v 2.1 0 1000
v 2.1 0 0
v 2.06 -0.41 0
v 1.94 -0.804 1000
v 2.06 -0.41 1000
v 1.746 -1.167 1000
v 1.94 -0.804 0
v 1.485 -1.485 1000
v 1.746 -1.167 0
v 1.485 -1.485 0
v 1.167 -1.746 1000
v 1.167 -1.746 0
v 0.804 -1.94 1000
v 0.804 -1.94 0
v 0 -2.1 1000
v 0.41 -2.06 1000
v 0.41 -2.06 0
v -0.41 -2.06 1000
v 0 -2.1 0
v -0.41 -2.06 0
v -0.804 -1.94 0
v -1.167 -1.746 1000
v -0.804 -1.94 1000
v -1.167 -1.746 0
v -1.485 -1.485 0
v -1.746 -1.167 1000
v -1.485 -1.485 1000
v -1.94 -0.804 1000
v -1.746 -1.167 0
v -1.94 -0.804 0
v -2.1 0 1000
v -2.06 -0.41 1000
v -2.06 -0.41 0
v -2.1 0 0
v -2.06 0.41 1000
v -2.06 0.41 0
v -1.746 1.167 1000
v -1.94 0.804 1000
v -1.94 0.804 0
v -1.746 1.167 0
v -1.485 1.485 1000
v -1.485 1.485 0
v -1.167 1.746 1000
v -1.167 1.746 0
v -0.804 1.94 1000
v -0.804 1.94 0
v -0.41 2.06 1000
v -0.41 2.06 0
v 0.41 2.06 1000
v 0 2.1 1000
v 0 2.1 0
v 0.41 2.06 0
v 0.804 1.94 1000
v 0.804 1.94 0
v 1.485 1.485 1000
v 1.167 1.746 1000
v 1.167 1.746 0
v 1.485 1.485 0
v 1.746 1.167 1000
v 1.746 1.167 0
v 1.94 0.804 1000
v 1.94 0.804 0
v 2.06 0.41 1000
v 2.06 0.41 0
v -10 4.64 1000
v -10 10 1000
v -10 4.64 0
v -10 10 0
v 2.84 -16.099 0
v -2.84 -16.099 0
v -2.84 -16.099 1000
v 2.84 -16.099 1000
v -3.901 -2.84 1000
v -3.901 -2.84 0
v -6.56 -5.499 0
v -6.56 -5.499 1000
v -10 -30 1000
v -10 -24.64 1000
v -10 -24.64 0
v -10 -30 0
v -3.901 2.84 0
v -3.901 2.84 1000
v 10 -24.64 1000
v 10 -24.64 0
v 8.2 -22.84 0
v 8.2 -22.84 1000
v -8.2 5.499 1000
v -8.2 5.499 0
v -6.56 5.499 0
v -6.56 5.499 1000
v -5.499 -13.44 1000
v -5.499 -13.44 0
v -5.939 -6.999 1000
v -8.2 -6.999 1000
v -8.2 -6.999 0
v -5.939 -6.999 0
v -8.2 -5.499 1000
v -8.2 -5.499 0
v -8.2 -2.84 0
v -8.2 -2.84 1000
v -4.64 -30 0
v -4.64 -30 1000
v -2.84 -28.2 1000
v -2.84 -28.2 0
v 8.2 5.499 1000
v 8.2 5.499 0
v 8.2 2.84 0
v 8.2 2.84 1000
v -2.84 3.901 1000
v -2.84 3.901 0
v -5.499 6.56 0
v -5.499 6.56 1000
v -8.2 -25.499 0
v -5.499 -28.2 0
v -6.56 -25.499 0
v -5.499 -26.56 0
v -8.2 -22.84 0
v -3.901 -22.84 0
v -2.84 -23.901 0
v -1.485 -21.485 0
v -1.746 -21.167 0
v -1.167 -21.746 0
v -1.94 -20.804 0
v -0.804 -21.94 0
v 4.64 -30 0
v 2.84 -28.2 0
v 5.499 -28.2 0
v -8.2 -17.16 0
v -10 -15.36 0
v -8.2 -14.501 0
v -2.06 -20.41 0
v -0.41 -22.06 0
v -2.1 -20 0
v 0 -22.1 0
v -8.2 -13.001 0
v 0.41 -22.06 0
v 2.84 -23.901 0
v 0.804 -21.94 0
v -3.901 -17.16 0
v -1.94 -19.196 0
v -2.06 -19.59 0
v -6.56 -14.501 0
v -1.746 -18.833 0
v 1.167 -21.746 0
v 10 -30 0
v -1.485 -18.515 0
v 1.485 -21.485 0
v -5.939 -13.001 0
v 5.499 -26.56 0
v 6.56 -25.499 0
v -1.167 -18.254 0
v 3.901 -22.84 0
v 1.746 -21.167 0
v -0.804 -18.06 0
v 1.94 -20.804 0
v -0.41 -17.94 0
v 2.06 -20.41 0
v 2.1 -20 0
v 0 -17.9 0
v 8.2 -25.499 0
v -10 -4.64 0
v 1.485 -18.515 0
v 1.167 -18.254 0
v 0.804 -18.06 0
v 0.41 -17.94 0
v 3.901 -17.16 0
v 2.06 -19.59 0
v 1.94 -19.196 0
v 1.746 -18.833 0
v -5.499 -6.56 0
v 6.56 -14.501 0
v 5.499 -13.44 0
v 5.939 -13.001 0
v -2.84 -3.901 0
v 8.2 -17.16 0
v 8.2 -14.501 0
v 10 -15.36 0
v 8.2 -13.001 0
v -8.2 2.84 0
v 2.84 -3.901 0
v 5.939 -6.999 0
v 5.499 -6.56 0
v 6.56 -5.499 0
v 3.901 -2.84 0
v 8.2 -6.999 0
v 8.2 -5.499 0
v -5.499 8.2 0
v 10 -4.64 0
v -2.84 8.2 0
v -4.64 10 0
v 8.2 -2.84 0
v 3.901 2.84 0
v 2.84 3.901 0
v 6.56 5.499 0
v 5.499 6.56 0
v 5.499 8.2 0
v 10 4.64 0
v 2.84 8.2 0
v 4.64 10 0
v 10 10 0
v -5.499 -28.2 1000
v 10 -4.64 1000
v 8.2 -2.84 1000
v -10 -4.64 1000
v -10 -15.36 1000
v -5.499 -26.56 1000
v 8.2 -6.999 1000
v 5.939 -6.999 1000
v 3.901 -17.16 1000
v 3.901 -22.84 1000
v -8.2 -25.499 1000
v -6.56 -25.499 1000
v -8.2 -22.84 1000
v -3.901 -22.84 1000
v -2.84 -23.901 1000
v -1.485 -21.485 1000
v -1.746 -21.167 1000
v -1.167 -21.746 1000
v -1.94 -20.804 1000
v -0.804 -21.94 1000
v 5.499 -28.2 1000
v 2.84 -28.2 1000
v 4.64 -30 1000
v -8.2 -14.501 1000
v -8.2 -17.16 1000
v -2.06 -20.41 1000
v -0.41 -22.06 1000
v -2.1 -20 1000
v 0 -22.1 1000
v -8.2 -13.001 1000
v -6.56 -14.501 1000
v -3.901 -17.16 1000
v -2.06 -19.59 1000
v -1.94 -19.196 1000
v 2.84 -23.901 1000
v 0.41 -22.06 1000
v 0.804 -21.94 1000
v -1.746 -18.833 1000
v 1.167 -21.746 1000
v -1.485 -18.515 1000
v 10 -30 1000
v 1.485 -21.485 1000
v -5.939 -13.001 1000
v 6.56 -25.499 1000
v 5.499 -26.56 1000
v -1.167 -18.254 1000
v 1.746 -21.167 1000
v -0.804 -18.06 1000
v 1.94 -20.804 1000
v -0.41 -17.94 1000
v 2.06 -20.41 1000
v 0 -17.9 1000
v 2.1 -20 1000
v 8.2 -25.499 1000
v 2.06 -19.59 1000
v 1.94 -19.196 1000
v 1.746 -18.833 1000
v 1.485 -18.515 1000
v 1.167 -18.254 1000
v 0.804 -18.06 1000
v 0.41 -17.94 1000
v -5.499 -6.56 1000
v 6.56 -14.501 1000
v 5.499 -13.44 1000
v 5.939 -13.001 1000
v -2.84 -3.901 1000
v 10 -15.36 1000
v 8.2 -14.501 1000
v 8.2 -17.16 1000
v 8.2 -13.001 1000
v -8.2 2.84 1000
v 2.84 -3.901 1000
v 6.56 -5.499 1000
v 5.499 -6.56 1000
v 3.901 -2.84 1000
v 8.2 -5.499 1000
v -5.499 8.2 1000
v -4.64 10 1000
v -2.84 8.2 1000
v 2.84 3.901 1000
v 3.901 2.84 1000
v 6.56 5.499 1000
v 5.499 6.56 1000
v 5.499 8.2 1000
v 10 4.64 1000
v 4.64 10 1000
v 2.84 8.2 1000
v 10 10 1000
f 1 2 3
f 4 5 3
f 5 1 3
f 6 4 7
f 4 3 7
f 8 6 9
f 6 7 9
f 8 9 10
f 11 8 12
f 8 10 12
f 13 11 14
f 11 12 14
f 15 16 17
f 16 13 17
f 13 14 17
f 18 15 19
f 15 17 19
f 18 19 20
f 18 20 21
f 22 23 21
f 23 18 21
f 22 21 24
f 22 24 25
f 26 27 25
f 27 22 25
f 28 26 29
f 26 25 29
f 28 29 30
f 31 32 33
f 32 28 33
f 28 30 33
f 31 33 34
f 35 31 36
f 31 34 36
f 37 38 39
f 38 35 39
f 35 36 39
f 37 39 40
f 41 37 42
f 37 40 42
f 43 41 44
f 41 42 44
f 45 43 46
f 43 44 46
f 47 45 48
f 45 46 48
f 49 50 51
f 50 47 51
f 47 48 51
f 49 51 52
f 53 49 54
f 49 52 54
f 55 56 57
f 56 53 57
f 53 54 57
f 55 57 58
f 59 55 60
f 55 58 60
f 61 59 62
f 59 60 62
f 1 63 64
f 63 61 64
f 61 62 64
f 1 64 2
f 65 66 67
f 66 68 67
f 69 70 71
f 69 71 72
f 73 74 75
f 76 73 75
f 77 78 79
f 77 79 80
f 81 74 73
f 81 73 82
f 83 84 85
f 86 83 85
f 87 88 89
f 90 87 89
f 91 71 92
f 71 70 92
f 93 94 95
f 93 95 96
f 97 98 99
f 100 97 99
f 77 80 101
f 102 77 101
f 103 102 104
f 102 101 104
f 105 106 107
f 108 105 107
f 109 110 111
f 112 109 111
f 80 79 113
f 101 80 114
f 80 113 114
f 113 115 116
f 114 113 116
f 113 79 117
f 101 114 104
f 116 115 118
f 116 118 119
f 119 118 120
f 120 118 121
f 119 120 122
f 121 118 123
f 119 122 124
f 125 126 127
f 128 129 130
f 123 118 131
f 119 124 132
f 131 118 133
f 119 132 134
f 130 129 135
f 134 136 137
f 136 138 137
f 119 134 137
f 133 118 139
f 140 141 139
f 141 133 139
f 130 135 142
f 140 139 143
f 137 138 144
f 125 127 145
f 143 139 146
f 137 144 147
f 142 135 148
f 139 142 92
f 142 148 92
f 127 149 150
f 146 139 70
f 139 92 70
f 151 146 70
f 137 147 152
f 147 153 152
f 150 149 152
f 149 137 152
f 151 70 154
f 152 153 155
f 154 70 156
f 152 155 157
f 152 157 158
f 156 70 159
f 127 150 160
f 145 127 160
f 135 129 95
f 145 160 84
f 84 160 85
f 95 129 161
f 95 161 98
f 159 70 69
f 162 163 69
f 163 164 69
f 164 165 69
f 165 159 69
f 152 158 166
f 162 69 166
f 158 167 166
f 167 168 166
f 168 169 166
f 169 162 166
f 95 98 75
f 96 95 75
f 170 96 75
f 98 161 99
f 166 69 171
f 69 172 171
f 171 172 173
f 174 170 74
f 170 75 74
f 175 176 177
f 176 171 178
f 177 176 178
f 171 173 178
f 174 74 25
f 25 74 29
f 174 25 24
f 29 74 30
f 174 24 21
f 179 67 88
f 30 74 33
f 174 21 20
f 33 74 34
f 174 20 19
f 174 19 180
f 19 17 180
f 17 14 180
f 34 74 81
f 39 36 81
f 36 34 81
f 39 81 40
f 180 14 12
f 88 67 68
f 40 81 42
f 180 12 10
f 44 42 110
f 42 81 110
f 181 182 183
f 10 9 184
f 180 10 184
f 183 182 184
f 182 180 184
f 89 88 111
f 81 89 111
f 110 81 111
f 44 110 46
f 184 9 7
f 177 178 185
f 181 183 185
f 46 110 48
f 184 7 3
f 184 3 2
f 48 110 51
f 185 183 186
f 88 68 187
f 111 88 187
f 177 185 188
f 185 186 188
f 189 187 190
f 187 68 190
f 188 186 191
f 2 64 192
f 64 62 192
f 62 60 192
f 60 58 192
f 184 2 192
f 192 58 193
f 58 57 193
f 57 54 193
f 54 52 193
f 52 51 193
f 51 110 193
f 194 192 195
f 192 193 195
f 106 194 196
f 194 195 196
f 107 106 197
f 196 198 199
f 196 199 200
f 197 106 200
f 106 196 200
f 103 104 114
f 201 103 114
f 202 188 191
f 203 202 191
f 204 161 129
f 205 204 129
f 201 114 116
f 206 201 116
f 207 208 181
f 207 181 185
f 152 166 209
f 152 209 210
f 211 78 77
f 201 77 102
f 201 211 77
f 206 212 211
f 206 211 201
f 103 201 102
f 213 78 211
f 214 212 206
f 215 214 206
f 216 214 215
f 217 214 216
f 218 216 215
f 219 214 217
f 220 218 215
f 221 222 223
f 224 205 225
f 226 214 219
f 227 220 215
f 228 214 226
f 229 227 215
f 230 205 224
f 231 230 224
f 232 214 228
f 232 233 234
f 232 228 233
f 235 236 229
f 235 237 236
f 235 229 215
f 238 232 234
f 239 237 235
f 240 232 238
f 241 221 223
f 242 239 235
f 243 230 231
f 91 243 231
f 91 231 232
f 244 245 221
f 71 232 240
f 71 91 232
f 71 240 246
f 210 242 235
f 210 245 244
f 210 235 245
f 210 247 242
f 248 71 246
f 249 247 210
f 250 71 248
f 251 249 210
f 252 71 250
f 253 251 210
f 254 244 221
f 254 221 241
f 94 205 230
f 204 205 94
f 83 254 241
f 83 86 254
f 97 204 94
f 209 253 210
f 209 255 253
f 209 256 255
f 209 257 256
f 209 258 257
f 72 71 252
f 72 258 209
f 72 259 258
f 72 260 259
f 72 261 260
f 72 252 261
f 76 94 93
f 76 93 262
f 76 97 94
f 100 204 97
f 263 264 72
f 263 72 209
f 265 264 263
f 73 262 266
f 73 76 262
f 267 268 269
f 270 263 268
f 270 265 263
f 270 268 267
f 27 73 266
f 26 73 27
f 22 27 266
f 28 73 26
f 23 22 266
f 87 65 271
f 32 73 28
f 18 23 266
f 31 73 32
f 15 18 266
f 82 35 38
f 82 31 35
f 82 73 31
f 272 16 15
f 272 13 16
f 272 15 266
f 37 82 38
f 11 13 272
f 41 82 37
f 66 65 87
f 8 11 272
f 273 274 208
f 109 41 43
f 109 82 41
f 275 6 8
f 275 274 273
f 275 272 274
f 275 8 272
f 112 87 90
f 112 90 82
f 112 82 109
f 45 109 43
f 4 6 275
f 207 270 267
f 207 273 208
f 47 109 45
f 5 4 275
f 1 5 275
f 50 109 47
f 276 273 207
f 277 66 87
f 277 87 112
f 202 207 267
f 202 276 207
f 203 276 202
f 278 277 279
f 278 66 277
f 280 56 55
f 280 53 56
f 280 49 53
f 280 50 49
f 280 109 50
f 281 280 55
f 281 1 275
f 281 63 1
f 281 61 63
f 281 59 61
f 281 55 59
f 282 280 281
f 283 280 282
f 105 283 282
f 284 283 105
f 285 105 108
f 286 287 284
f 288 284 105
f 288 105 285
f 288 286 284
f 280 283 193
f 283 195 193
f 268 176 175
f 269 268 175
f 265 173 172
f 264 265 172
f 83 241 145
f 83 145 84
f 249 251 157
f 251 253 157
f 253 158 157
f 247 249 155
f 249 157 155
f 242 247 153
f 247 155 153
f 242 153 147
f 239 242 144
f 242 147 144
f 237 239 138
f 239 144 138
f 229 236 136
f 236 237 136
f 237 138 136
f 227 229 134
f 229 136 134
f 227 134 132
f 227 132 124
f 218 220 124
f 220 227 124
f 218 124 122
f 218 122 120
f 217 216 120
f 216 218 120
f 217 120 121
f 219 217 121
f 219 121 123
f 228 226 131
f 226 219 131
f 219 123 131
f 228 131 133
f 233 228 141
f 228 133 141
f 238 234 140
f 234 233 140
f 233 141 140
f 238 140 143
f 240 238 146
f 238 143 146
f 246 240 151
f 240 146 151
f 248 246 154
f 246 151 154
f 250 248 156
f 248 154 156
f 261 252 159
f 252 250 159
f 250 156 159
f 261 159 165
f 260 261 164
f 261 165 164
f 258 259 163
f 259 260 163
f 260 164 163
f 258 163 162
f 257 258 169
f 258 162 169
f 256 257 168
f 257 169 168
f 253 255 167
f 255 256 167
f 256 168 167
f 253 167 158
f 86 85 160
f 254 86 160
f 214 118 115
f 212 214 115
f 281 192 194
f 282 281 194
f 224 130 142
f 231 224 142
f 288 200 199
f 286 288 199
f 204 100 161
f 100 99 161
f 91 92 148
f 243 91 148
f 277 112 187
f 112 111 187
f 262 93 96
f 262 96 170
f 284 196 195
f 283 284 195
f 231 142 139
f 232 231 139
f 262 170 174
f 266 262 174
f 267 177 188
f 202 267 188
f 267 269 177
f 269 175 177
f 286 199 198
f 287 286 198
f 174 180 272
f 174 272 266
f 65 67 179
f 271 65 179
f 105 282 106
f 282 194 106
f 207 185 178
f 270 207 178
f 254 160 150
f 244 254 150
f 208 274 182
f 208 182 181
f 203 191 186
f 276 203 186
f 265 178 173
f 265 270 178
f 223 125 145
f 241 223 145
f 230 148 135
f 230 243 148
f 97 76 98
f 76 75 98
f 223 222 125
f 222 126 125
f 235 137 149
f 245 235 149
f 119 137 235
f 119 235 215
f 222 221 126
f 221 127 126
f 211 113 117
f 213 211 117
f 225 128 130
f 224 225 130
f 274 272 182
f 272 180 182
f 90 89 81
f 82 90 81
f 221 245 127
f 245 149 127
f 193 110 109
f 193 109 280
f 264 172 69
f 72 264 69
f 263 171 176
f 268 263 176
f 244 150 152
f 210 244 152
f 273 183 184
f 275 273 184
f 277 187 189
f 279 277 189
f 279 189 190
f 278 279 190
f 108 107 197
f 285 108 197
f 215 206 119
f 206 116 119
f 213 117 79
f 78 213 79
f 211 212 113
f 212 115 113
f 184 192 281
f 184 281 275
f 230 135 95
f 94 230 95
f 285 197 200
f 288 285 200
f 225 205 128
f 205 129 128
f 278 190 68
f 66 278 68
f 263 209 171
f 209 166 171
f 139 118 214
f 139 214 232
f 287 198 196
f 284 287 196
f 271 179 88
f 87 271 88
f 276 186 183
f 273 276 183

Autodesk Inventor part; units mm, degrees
ref_plane "YZ Plane" through (0, 0, 0) normal (1, 0, 0) x (0, 1, 0)
ref_plane "XY Plane" through (0, 0, 0) normal (0, 0, 1) x (1, 0, 0)
sketch "Sketch1" plane through (0, 0, 0) normal (0, 0, 1) x (1, 0, 0)
  line L0 (-3.9007, 3.9007) -> (3.9007, 3.9007)
  line L1 (3.9007, 3.9007) -> (3.9007, -3.9007)
  line L2 (3.9007, -3.9007) -> (-3.9007, -3.9007)
  line L3 (-3.9007, -3.9007) -> (-3.9007, 3.9007)
  line L4 (0, 3.9007) -> (0, -3.9007) construction
  line L5 (-3.9007, 0) -> (3.9007, 0) construction
  circle A0 centre (0, 0) radius 2.1
  line L6 (0, 0) -> (-16.1173, 16.1173) construction
  line L7 (0, 0) -> (22.7933, 0) construction
  line L8 (-2.84, 3.9007) -> (-5.4993, 6.56)
  line L9 (-5.4993, 6.56) -> (-5.4993, 8.2)
  line L10 (-5.4993, 8.2) -> (-2.84, 8.2)
  line L11 (-2.84, 8.2) -> (-4.64, 10)
  line L12 (-4.64, 10) -> (-10, 10)
  line L13 (-10, 10) -> (-10, 4.64)
  line L14 (-10, 4.64) -> (-8.2, 2.84)
  line L15 (-8.2, 2.84) -> (-8.2, 5.4993)
  line L16 (-8.2, 5.4993) -> (-6.56, 5.4993)
  line L17 (-6.56, 5.4993) -> (-3.9007, 2.84)
  line L18 (-3.9007, 2.84) -> (-11.3102, 2.84) construction
  line L19 (-2.84, 3.9007) -> (-3.9007, 3.9007)
  line L20 (-3.9007, 2.84) -> (-3.9007, 3.9007)
  line L21 (-3.9007, -2.84) -> (-6.56, -5.4993)
  line L22 (-6.56, -5.4993) -> (-8.2, -5.4993)
  line L23 (-8.2, -5.4993) -> (-8.2, -2.84)
  line L24 (-8.2, -2.84) -> (-10, -4.64)
  line L25 (-10, -4.64) -> (-10, -10)
  line L26 (-10, -10) -> (-4.64, -10)
  line L27 (-4.64, -10) -> (-2.84, -8.2)
  line L28 (-2.84, -8.2) -> (-5.4993, -8.2)
  line L29 (-5.4993, -8.2) -> (-5.4993, -6.56)
  line L30 (-5.4993, -6.56) -> (-2.84, -3.9007)
  line L31 (-3.9007, -2.84) -> (-3.9007, -3.9007)
  line L32 (-2.84, -3.9007) -> (-3.9007, -3.9007)
  line L33 (2.84, -3.9007) -> (5.4993, -6.56)
  line L34 (5.4993, -6.56) -> (5.4993, -8.2)
  line L35 (5.4993, -8.2) -> (2.84, -8.2)
  line L36 (2.84, -8.2) -> (4.64, -10)
  line L37 (4.64, -10) -> (10, -10)
  line L38 (10, -10) -> (10, -4.64)
  line L39 (10, -4.64) -> (8.2, -2.84)
  line L40 (8.2, -2.84) -> (8.2, -5.4993)
  line L41 (8.2, -5.4993) -> (6.56, -5.4993)
  line L42 (6.56, -5.4993) -> (3.9007, -2.84)
  line L43 (2.84, -3.9007) -> (3.9007, -3.9007)
  line L44 (3.9007, -2.84) -> (3.9007, -3.9007)
  line L45 (3.9007, 2.84) -> (6.56, 5.4993)
  line L46 (6.56, 5.4993) -> (8.2, 5.4993)
  line L47 (8.2, 5.4993) -> (8.2, 2.84)
  line L48 (8.2, 2.84) -> (10, 4.64)
  line L49 (10, 4.64) -> (10, 10)
  line L50 (10, 10) -> (4.64, 10)
  line L51 (4.64, 10) -> (2.84, 8.2)
  line L52 (2.84, 8.2) -> (5.4993, 8.2)
  line L53 (5.4993, 8.2) -> (5.4993, 6.56)
  line L54 (5.4993, 6.56) -> (2.84, 3.9007)
  line L55 (3.9007, 2.84) -> (3.9007, 3.9007)
  line L56 (2.84, 3.9007) -> (3.9007, 3.9007)
  dimension "d7" = 4.2
  dimension "d8" = 135
  dimension "d9" = 1.5
  dimension "d10" = 1.64
  dimension "d11" = 1.8
  dimension "d12" = 2.84
  dimension "d13" = 10
  dimension "d16" = 360
extrude "Extrusion1" add sketch "Sketch1" along normal blind 1000
pattern_linear "Rectangular Pattern1" count 2 spacing 20 along (0, -1, 0) of "Extrusion1"
sketch "Sketch2" plane through (0, 0, 1000) normal (0, 0, 1) x (1, 0, 0)
  line L0 (8.2, -2.84) -> (8.2, -5.4993) projected
  line L1 (8.2, -5.4993) -> (6.56, -5.4993) projected
  line L2 (-6.56, -5.4993) -> (-8.2, -5.4993) projected
  line L3 (-8.2, -5.4993) -> (-8.2, -2.84) projected
  line L4 (-8.2, -14.5007) -> (-6.56, -14.5007) projected
  line L5 (6.56, -14.5007) -> (8.2, -14.5007) projected
  line L6 (5.4993, -11.8) -> (5.4993, -13.44) projected
  line L7 (5.4993, -13.44) -> (2.84, -16.0993) projected
  line L8 (-2.84, -16.0993) -> (-5.4993, -13.44) projected
  line L9 (-5.4993, -8.2) -> (-5.4993, -6.56) projected
  line L10 (-5.4993, -6.56) -> (-2.84, -3.9007) projected
  line L11 (2.84, -3.9007) -> (5.4993, -6.56) projected
  line L12 (2.84, -8.2) -> (4.64, -10) projected
  line L13 (-8.2, -6.9993) -> (-5.9387, -6.9993)
  line L14 (-5.9387, -6.9993) -> (-4.1231, -5.1837)
  line L15 (-4.1231, -5.1837) -> (4.1231, -5.1837)
  line L16 (4.1231, -5.1837) -> (5.9387, -6.9993)
  line L17 (5.9387, -6.9993) -> (8.2, -6.9993)
  line L18 (8.2, -6.9993) -> (8.2, -13.0007)
  line L19 (8.2, -13.0007) -> (5.9387, -13.0007)
  line L20 (5.9387, -13.0007) -> (4.2461, -14.6932)
  line L21 (4.2461, -14.6932) -> (-4.2461, -14.6932)
  line L22 (-4.2461, -14.6932) -> (-5.9387, -13.0007)
  line L23 (-5.9387, -13.0007) -> (-8.2, -13.0007)
  line L24 (-8.2, -13.0007) -> (-8.2, -6.9993)
  dimension "d23" = 1.5
  dimension "d24" = 1.5
  dimension "d25" = 1.5
  dimension "d26" = 1.5
extrude "Extrusion2" cut sketch "Sketch2" against normal up to next
ref_plane "Work Plane1" through (0, -10, 0) normal (0, 1, 0) x (-1, 0, 0)
equation "\"d24\" = d23"
equation "\"d25\" = d23"
equation "\"d26\" = d23"
properties part number "20x40x1000mm" material "Aluminum 6061"
